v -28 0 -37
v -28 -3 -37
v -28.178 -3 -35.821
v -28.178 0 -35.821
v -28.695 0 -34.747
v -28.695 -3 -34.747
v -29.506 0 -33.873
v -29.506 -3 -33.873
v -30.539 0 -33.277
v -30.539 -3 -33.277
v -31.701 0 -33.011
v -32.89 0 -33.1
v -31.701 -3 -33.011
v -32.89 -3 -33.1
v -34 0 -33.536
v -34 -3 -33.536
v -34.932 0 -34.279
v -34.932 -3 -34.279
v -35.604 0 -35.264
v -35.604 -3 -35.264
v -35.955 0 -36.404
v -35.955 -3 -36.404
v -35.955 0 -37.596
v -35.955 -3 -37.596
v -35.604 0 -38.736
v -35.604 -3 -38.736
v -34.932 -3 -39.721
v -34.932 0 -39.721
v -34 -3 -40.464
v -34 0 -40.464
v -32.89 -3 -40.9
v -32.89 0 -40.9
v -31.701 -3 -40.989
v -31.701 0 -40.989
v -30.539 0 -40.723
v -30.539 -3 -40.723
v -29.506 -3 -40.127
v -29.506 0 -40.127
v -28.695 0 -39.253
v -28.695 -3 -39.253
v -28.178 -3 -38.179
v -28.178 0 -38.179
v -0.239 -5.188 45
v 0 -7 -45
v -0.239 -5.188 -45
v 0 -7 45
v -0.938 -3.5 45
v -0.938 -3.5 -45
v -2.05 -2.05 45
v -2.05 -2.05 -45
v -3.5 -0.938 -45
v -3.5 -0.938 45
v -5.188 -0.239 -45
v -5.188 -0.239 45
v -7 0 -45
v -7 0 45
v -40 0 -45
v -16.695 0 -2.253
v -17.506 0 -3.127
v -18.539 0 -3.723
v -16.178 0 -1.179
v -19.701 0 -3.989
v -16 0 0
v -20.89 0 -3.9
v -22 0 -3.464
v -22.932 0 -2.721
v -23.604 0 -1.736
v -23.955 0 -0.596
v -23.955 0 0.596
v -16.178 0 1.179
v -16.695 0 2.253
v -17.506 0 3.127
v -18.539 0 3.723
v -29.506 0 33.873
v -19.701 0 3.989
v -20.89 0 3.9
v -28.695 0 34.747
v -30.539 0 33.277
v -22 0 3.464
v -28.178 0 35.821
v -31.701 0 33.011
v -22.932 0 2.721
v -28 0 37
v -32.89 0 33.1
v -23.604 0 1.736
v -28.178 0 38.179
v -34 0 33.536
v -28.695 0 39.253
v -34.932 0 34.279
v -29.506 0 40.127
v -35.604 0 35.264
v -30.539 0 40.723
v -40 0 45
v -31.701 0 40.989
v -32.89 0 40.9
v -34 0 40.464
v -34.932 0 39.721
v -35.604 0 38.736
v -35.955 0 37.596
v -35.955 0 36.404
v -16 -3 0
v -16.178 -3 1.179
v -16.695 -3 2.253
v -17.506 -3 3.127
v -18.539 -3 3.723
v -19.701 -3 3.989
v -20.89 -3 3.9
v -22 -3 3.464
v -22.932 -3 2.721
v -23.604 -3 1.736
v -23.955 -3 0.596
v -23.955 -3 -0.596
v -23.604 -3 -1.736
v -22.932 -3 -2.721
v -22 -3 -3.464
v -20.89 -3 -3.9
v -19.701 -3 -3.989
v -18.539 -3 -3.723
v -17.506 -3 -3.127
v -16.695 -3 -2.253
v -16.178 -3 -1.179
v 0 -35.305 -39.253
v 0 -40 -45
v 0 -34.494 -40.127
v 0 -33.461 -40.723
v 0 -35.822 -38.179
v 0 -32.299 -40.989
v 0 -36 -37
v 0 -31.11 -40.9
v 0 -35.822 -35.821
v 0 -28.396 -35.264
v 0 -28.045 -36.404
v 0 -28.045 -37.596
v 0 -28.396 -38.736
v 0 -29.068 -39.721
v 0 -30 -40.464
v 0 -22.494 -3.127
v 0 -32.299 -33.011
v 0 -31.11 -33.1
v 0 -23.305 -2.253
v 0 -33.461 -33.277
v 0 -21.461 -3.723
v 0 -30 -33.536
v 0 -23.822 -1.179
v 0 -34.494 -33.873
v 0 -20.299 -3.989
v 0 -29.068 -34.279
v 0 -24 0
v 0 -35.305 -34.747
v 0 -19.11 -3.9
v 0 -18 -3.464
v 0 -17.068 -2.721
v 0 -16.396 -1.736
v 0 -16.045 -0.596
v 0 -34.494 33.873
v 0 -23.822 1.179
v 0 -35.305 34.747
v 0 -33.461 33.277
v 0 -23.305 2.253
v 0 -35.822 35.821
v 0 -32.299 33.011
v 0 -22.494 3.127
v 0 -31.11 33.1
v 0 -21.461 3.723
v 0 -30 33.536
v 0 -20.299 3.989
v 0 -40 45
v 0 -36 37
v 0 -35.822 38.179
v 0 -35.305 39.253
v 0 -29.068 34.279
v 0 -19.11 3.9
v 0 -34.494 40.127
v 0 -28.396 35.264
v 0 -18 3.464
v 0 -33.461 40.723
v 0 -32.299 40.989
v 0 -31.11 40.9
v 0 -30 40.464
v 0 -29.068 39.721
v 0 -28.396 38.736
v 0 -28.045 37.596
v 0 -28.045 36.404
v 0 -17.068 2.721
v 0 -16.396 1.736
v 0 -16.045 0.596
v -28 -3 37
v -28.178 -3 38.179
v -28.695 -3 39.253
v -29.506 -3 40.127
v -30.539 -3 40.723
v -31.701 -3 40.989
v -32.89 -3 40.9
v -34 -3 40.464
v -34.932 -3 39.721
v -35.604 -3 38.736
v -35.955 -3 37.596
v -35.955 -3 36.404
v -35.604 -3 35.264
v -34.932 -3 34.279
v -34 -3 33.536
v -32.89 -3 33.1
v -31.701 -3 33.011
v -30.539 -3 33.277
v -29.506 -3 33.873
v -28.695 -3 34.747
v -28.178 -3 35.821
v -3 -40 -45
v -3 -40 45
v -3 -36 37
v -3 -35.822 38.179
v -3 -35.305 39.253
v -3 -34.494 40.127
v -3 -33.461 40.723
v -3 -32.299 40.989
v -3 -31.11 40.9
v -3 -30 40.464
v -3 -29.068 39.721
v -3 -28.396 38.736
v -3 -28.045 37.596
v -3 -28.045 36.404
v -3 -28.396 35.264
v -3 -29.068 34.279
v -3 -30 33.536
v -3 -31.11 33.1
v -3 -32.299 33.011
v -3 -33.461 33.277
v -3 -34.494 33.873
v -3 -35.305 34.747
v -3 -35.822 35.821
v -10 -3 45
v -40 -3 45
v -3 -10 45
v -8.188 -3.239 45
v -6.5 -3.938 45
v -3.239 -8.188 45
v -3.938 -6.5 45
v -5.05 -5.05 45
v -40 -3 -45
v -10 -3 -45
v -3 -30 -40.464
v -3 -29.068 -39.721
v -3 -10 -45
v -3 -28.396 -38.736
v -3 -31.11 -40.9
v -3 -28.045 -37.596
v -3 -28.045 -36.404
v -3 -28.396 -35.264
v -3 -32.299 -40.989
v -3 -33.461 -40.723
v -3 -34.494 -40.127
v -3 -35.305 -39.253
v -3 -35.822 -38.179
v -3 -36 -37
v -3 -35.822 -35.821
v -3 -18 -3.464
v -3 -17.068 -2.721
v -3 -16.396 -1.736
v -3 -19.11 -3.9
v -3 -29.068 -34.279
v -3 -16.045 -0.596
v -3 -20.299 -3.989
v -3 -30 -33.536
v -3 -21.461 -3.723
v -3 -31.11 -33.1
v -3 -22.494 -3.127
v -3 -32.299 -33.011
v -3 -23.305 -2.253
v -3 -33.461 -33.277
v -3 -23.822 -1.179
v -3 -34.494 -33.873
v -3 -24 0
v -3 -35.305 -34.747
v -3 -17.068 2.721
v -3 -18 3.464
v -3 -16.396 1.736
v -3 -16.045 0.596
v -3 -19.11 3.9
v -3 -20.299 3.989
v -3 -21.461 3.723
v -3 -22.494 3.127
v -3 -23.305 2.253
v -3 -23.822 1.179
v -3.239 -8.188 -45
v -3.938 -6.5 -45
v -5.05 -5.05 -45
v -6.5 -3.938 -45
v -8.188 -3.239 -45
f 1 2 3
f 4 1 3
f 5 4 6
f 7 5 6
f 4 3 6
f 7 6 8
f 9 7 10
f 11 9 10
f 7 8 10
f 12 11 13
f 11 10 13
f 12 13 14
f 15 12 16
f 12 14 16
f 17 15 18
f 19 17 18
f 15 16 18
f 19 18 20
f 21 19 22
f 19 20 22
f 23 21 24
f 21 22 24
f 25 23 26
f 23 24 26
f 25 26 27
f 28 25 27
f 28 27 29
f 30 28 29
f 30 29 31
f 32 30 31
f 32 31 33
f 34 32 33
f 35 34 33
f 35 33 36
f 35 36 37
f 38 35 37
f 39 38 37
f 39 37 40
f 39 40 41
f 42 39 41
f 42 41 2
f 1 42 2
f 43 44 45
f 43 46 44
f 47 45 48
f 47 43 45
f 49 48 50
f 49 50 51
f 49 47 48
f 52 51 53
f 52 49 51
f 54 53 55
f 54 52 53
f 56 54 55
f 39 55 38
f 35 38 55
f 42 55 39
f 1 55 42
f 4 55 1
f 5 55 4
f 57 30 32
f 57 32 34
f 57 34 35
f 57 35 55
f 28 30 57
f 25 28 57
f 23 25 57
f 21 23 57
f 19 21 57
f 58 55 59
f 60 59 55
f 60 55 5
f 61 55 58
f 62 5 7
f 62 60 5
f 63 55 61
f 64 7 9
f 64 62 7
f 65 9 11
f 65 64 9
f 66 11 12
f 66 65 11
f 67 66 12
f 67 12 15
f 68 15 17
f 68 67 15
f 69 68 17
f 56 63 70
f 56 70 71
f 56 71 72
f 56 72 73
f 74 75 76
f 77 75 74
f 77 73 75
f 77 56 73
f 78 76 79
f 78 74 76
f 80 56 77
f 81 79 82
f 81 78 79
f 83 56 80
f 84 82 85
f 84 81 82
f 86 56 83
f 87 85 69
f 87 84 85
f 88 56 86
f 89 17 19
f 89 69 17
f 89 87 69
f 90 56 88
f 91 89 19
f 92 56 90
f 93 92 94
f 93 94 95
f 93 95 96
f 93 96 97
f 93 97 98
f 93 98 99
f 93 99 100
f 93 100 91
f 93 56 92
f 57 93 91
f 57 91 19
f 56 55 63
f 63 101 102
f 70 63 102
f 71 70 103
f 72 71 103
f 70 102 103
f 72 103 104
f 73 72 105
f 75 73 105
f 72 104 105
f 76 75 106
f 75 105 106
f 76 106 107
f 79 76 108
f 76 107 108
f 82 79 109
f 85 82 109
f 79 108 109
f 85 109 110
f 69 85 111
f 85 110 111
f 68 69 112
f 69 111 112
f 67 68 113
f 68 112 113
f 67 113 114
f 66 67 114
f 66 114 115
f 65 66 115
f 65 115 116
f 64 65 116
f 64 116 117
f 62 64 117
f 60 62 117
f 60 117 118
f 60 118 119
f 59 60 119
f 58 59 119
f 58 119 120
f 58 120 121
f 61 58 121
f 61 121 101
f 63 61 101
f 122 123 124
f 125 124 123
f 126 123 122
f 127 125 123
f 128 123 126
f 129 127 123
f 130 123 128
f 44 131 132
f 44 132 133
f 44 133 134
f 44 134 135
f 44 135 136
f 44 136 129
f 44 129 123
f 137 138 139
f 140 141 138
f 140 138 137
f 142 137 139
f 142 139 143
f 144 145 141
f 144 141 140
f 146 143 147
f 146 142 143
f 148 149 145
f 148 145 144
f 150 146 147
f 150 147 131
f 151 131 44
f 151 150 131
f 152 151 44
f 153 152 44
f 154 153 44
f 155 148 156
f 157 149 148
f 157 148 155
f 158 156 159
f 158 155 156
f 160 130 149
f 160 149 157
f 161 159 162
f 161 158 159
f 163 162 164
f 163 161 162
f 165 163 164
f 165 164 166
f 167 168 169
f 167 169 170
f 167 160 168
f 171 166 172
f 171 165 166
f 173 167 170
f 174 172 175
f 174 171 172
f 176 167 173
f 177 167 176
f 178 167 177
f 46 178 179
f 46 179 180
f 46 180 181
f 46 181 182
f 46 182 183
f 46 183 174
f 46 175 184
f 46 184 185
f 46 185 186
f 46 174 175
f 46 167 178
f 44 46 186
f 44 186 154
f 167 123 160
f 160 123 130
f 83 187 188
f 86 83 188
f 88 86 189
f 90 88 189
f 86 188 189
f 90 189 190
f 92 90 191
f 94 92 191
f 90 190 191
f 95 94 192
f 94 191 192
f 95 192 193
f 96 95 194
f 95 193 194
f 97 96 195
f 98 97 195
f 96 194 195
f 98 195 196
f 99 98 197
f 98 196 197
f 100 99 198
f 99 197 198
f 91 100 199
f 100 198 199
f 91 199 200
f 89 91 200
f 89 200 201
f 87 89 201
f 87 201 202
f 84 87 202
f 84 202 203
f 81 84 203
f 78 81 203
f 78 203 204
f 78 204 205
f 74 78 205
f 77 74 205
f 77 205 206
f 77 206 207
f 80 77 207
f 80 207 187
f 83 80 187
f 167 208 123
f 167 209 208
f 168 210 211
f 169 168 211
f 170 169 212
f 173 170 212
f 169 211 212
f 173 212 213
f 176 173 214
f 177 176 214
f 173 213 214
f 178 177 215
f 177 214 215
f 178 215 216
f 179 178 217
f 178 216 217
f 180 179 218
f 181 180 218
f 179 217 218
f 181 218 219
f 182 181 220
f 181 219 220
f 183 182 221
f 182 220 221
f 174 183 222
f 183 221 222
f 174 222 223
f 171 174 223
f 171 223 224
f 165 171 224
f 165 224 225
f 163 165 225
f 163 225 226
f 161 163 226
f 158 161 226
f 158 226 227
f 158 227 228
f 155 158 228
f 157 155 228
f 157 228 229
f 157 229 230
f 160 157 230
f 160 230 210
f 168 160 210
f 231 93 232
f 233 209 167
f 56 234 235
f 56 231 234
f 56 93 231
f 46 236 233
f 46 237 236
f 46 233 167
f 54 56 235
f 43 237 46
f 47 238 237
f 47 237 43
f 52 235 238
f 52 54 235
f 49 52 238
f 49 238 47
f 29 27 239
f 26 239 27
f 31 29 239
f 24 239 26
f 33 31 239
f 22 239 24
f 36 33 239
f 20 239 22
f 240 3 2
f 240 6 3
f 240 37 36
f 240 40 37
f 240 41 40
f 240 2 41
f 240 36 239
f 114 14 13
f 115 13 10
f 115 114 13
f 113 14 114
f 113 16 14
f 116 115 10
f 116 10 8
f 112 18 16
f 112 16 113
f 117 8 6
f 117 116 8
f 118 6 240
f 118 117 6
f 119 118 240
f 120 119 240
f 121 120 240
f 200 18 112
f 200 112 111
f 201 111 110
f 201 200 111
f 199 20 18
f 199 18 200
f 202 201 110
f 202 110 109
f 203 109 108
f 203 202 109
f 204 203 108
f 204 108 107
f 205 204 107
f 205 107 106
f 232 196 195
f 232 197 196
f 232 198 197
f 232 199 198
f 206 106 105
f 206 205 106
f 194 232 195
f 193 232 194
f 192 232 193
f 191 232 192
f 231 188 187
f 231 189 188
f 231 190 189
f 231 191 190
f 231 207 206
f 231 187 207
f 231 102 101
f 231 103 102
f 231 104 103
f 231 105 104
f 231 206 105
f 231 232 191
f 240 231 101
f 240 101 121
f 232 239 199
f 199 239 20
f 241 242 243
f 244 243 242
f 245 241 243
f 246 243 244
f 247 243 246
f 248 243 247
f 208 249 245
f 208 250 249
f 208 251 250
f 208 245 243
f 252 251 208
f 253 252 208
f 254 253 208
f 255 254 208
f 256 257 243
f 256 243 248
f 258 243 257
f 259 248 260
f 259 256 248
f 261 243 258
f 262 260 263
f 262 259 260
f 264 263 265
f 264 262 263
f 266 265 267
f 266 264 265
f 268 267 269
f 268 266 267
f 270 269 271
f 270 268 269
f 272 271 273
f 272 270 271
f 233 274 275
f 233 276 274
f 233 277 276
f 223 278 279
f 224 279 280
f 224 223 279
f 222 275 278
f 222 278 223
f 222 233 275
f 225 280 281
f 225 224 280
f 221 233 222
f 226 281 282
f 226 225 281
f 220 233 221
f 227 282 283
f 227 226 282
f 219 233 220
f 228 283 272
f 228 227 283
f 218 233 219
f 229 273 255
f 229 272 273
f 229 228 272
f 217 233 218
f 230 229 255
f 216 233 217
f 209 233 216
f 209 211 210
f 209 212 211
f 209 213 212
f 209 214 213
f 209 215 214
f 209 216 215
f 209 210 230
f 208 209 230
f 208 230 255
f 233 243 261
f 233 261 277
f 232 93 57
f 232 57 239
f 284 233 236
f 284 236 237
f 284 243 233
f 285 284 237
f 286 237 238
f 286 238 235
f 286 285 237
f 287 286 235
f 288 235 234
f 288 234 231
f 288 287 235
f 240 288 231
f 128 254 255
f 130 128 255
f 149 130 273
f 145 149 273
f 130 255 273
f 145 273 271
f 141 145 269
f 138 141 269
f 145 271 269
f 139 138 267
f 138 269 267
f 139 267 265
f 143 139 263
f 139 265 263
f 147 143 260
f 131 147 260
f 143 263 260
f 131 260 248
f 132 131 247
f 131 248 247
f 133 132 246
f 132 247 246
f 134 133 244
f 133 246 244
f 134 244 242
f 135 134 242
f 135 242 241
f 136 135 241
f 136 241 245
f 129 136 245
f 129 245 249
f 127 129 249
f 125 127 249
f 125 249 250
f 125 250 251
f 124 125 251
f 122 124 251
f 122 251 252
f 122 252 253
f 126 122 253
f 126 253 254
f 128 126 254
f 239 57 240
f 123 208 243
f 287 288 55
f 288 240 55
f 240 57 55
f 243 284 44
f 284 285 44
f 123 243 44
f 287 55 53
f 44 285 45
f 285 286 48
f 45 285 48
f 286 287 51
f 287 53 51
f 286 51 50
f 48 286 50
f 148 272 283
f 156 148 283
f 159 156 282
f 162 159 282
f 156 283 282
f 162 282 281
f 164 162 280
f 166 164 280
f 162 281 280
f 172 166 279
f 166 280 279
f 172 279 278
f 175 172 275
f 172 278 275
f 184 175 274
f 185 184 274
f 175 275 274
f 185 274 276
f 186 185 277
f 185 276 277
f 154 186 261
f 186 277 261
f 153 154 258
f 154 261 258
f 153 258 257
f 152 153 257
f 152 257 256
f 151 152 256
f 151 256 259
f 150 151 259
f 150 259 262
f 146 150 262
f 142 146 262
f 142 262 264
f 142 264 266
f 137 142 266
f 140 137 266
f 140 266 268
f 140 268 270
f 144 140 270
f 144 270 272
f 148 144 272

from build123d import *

# Parameters (mm, degrees)
F1_DEPTH = 45
F2_R     = 7
F3_R     = 4
F4_DEPTH = 3.001
F5_R     = 4
F6_DEPTH = 3.001


with BuildPart() as f1:
    # F0 (on Top) → F1 (new body, symmetric)
    with BuildSketch(Plane.XY):
        Polygon((0, -40), (0, 0), (-40, 0), (-40, -3), (-3, -3), (-3, -40), align=None)
    extrude(amount=F1_DEPTH, both=True)

    # F2
    f2_edges = [f1.edges().sort_by_distance(p)[0] for p in [
        (-3, -3, 0),
        (0, 0, 0),
    ]]
    fillet(f2_edges, radius=F2_R)

    # F3 (on face) → F4 (cut, through all)
    with BuildSketch(Plane.XZ.offset(3)):
        with Locations((-32, 37)):
            Circle(F3_R)
        with Locations((-20, 0)):
            Circle(F3_R)
        with Locations((-32, -37)):
            Circle(F3_R)
    extrude(amount=-F4_DEPTH, mode=Mode.SUBTRACT)

    # F5 (on face) → F6 (cut, through all)
    with BuildSketch(Plane(origin=(-3, 0, 0), x_dir=(0, -1, 0), z_dir=(-1, 0, 0))):
        with Locations((32, 37)):
            Circle(F5_R)
        with Locations((20, 0)):
            Circle(F5_R)
        with Locations((32, -37)):
            Circle(F5_R)
    extrude(amount=-F6_DEPTH, mode=Mode.SUBTRACT)


solid = f1.part
